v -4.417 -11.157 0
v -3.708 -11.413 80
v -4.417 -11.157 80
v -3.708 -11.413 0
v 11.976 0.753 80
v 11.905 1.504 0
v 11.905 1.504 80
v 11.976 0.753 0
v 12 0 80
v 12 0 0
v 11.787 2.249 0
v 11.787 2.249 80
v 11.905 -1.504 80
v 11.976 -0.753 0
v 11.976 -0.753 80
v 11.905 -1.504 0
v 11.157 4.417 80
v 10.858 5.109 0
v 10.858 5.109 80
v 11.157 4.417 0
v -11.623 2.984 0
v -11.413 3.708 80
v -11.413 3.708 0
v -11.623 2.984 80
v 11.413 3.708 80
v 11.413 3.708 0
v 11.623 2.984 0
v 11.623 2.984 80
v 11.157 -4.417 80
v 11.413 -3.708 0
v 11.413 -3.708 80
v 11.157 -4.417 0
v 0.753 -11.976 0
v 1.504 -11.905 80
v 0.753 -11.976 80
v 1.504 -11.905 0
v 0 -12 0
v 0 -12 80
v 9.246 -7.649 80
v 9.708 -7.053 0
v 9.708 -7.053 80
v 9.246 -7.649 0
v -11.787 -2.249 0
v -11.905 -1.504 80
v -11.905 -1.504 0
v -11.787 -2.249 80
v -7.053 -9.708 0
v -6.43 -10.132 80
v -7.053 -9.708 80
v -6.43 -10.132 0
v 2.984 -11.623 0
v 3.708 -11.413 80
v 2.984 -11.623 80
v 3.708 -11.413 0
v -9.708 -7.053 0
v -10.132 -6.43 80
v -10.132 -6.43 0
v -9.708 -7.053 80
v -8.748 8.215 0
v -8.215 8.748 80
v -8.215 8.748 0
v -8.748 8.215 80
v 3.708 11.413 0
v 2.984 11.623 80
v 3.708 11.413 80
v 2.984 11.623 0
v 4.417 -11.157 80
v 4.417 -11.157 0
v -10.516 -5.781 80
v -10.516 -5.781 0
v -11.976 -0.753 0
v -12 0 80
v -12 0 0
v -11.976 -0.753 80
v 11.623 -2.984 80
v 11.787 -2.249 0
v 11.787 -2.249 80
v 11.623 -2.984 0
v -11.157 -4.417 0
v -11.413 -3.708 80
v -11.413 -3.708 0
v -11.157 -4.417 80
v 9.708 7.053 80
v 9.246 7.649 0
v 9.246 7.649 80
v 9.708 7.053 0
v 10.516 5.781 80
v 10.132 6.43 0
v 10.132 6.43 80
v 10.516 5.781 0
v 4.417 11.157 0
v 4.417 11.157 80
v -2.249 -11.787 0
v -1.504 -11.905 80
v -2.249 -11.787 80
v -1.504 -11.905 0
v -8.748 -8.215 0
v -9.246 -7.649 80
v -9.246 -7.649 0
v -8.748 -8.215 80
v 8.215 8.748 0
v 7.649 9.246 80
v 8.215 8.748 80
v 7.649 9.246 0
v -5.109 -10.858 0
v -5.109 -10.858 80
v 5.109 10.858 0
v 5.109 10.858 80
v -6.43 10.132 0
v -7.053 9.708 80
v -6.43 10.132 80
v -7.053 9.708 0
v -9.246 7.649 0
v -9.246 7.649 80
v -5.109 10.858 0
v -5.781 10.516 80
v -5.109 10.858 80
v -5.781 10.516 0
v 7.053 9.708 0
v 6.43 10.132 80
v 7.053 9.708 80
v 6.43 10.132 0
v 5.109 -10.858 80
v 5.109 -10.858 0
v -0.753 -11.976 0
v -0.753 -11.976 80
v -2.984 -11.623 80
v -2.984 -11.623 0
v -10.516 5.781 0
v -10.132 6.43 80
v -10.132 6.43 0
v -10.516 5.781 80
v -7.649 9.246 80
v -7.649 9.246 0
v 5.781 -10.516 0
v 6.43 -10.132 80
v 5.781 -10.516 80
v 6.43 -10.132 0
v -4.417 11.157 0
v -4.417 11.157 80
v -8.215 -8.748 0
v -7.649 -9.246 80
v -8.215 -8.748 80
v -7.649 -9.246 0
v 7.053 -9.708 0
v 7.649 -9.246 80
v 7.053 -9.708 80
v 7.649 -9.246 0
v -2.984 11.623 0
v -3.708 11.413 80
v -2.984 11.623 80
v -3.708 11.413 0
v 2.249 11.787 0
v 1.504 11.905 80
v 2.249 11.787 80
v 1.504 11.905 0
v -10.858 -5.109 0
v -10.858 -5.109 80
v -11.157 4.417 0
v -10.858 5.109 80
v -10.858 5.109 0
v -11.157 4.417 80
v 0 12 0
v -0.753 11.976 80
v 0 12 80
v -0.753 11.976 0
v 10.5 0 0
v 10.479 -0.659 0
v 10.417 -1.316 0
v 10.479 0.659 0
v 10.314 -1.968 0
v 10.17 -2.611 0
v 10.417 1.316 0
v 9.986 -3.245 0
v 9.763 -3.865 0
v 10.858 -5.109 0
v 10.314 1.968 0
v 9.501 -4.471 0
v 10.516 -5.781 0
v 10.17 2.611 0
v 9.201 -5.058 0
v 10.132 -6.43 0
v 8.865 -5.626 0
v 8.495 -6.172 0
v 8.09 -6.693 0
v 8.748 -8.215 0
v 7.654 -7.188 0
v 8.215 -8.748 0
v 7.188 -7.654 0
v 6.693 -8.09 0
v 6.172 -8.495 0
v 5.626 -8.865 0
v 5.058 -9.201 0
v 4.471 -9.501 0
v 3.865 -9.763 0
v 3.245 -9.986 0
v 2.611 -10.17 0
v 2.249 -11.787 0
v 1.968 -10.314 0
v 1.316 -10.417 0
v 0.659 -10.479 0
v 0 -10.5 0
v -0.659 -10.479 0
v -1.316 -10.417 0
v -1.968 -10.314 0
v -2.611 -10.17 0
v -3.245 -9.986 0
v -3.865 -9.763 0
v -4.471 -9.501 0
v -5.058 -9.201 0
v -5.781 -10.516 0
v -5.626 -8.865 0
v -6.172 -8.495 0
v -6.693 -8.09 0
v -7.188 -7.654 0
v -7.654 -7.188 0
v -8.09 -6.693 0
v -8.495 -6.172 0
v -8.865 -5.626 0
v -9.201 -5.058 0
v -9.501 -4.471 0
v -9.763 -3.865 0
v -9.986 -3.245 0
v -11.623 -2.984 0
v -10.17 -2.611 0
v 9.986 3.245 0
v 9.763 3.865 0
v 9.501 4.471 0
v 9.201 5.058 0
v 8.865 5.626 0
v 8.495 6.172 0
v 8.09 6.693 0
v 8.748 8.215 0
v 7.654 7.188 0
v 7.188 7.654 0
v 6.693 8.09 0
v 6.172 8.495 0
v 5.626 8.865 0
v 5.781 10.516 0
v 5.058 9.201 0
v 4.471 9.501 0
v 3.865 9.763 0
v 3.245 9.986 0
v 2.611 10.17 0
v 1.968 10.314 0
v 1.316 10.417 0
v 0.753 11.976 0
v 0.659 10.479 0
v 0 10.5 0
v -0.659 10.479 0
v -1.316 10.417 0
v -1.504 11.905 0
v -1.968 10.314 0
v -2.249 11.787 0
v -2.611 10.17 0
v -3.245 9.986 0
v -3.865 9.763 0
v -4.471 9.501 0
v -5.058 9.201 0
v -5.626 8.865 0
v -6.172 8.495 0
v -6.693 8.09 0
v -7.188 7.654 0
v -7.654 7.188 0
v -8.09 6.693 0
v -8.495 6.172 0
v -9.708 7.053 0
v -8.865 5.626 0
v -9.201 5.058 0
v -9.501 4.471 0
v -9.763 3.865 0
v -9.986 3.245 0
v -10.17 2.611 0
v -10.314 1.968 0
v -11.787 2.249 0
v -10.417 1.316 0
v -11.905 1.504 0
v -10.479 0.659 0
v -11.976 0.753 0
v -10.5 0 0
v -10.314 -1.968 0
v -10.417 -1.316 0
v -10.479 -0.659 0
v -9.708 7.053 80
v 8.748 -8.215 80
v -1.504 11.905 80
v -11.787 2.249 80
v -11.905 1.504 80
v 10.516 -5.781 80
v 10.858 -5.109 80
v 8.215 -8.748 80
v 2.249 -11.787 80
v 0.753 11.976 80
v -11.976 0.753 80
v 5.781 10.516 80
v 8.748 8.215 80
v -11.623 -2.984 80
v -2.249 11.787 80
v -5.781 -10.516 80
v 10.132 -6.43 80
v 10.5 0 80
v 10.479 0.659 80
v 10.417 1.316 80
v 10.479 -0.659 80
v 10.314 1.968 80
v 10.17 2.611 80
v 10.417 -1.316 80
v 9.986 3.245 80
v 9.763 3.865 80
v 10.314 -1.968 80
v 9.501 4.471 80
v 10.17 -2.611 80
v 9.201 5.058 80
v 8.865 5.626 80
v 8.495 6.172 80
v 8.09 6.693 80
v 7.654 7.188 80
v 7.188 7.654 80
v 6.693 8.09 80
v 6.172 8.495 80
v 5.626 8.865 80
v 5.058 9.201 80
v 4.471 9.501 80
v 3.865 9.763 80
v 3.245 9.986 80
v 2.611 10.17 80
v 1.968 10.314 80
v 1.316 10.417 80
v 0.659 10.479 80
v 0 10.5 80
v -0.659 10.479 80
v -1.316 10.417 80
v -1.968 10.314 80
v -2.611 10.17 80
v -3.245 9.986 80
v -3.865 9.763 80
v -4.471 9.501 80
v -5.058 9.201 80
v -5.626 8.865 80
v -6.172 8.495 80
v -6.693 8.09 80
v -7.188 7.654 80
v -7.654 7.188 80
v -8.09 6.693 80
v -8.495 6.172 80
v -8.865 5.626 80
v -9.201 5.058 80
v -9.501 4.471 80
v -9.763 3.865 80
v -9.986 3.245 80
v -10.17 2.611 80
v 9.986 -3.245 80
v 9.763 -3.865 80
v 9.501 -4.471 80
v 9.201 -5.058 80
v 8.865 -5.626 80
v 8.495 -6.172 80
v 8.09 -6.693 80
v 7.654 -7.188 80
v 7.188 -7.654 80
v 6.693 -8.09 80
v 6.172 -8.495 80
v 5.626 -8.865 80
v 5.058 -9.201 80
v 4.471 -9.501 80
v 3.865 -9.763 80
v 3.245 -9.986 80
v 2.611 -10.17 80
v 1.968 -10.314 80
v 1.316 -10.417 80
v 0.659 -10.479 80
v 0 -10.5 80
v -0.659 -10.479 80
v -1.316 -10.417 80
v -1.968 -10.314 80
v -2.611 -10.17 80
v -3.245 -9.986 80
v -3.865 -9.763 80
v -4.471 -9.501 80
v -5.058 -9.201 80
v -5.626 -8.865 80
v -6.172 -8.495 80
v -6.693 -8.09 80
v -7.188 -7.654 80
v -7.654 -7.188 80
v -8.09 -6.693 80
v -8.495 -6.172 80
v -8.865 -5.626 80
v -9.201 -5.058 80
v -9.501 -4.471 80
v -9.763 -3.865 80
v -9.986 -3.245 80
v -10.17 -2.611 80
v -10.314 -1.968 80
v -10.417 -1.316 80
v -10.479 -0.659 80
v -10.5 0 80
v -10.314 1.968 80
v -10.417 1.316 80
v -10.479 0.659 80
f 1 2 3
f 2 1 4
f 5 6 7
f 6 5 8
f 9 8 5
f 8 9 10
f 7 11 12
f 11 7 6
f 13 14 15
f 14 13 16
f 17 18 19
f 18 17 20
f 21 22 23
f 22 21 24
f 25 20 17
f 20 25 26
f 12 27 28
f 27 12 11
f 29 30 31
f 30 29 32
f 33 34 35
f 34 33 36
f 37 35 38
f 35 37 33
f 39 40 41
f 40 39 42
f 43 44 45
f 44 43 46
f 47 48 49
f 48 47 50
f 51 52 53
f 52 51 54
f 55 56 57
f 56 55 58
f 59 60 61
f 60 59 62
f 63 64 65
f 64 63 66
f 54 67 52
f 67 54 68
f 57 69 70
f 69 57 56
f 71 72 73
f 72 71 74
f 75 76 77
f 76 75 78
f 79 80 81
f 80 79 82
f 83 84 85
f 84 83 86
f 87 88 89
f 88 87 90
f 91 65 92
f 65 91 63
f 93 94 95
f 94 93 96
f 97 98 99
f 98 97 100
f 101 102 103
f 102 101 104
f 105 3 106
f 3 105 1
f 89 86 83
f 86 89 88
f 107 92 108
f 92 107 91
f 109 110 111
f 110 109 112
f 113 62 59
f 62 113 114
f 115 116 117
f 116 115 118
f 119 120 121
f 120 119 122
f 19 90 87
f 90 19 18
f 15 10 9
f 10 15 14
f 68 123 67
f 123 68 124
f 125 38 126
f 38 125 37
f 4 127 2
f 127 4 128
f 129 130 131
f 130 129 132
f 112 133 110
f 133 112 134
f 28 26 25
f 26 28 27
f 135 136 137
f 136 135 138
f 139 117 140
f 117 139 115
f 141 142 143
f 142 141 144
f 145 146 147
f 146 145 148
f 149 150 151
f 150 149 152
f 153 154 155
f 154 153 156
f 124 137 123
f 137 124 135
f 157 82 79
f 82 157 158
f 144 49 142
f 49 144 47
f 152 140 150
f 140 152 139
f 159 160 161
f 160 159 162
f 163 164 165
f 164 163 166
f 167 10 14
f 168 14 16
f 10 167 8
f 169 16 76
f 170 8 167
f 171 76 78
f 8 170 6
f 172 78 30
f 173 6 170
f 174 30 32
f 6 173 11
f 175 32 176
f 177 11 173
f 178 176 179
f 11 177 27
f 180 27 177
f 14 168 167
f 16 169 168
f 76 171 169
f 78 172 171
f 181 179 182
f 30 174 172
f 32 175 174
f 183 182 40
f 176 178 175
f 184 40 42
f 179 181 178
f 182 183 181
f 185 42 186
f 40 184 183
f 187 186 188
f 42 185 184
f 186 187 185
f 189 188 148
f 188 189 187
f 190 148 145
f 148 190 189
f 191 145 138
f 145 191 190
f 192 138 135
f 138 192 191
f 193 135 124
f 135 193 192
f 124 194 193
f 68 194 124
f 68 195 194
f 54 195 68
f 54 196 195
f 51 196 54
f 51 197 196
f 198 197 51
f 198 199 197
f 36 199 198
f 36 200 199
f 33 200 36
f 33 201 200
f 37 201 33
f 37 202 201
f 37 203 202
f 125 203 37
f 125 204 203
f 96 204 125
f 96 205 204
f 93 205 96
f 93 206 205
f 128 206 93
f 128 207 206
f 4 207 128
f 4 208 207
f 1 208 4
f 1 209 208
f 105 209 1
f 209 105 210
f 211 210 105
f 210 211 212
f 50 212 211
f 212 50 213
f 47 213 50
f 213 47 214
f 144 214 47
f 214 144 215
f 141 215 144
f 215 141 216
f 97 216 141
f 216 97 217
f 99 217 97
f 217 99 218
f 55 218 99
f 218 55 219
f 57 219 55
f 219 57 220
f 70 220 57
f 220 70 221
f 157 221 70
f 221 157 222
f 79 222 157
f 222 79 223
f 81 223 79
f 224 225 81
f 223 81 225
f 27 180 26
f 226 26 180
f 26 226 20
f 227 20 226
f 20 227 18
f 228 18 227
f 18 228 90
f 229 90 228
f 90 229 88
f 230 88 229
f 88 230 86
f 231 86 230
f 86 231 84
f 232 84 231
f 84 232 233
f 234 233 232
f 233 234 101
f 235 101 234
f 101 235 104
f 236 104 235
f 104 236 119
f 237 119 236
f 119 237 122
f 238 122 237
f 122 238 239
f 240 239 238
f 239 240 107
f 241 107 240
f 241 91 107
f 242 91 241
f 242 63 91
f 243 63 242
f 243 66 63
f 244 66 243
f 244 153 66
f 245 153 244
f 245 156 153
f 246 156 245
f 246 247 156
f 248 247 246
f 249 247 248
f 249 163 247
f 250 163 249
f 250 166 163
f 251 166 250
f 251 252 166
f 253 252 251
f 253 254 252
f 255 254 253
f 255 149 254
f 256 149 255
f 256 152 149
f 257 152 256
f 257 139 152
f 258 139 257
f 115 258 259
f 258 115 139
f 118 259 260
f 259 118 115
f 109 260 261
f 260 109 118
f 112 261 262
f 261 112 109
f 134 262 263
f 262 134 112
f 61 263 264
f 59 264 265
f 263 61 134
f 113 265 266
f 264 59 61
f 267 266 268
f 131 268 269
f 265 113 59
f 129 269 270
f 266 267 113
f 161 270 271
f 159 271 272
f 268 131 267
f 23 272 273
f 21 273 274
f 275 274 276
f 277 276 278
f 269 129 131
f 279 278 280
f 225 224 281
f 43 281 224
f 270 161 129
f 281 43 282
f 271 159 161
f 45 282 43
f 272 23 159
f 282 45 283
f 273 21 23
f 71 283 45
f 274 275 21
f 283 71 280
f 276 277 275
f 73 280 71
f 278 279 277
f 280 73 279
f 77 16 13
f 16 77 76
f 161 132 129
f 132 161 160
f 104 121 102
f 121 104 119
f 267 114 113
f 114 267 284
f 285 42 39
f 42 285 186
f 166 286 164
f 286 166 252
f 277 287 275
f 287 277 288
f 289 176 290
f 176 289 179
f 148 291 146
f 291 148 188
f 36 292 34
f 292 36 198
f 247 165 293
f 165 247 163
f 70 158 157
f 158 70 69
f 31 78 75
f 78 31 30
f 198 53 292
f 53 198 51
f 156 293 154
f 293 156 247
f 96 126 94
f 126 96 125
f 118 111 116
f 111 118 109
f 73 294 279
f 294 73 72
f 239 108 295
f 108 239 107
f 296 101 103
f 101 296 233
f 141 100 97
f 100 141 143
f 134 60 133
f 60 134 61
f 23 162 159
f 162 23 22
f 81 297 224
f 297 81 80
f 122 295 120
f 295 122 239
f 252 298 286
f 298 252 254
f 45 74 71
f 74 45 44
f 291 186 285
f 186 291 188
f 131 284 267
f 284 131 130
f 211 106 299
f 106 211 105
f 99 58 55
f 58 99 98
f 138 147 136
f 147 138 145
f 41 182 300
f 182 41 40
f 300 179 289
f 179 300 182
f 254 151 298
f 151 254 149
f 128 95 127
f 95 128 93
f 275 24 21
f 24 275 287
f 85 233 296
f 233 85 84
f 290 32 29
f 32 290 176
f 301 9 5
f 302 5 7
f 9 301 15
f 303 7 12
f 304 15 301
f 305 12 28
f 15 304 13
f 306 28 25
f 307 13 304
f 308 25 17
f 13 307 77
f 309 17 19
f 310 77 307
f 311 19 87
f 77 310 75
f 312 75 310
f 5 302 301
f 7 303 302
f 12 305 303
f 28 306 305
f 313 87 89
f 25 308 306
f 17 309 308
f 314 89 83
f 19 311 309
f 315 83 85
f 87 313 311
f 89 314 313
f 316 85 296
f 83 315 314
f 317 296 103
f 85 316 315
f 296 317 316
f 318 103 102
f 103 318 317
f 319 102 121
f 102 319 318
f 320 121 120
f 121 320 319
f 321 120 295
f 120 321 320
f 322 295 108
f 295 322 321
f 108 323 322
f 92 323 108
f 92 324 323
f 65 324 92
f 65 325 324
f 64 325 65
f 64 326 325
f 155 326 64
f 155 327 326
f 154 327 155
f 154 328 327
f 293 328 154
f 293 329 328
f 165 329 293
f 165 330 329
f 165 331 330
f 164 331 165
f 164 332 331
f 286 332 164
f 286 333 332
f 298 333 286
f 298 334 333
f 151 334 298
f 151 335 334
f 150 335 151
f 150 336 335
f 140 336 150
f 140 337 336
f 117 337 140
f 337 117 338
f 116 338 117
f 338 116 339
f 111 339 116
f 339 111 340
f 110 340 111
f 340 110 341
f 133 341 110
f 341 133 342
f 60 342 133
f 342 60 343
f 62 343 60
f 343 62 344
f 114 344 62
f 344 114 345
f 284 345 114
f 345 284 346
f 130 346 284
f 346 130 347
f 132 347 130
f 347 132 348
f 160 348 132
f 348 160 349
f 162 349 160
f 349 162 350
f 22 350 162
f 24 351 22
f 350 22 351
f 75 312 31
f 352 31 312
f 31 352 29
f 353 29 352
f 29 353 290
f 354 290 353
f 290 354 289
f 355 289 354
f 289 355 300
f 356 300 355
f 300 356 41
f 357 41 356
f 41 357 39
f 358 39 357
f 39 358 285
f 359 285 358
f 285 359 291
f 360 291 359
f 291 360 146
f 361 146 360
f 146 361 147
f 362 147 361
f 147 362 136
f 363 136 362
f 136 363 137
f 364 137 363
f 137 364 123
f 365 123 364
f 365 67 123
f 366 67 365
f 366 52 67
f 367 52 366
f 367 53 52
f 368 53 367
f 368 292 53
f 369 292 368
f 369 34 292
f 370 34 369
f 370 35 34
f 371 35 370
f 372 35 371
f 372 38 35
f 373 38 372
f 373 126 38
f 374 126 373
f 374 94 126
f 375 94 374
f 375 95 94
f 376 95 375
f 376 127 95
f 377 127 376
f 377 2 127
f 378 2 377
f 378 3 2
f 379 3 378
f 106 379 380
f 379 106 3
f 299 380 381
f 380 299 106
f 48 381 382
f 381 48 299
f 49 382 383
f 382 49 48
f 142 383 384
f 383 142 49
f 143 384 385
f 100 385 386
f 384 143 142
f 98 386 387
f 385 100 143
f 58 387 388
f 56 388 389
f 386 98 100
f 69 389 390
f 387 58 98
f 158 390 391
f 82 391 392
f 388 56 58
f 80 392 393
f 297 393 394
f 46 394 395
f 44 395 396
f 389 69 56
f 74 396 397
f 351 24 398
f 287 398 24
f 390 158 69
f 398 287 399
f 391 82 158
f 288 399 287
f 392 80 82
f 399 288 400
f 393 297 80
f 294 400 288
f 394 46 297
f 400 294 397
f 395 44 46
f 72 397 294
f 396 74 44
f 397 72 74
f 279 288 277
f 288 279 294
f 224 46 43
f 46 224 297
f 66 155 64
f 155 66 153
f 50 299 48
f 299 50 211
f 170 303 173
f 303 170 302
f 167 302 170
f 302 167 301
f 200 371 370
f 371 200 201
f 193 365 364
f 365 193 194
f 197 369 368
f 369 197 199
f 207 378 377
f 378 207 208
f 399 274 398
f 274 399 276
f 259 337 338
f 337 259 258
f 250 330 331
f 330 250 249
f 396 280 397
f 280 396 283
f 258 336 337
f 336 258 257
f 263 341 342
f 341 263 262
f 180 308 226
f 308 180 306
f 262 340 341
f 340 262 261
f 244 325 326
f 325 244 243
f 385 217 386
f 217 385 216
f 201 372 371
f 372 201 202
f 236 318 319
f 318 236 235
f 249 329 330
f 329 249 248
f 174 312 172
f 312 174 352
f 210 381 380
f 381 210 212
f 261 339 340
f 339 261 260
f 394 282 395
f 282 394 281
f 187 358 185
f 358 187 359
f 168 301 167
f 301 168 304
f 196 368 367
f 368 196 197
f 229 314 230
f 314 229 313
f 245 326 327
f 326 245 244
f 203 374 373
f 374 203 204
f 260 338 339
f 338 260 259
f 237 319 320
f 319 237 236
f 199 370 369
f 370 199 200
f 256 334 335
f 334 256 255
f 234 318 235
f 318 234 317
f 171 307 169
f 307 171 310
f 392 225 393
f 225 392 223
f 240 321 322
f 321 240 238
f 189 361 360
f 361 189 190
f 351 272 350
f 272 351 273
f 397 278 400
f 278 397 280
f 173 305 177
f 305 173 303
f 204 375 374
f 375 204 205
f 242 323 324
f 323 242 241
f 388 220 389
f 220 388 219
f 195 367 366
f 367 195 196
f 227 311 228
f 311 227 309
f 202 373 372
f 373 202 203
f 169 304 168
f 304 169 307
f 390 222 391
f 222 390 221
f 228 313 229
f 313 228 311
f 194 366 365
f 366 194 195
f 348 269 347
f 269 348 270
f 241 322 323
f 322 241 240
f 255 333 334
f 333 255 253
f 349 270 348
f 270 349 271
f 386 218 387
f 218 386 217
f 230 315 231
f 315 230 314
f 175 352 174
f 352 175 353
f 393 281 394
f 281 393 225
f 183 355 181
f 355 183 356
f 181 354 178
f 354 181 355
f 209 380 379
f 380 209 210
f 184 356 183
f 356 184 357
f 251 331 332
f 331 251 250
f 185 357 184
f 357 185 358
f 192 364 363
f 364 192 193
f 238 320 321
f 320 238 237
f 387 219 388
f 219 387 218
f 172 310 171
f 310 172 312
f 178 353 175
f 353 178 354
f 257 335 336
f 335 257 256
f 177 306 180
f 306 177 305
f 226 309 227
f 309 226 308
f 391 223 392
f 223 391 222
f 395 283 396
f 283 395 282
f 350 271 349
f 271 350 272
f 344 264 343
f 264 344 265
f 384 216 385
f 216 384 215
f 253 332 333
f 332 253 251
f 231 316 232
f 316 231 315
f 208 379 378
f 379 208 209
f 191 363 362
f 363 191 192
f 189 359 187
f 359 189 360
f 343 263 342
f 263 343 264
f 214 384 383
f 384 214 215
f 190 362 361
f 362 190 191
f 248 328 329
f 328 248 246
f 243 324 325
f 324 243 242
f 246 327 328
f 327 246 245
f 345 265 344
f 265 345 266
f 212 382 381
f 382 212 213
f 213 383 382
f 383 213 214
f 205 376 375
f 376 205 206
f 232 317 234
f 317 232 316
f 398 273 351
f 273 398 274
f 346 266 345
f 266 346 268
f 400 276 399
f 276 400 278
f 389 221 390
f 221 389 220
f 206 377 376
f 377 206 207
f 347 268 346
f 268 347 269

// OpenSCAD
//-------------------------------------------------------------------------------------------
//-- Soporte para rollo de filamento de prusa i3. (c) Antonio Castro Gómez
//-------------------------------------------------------------------------------------------
//-- Released under the GPL license
//-------------------------------------------------------------------------------------------

difference()
{
	translate([0,0,40])cylinder(h=80, r=12, $fn=100, center=true);
	translate([-0,0,39])cylinder(h=90, r=10.5, $fn=100, center=true);	
}
